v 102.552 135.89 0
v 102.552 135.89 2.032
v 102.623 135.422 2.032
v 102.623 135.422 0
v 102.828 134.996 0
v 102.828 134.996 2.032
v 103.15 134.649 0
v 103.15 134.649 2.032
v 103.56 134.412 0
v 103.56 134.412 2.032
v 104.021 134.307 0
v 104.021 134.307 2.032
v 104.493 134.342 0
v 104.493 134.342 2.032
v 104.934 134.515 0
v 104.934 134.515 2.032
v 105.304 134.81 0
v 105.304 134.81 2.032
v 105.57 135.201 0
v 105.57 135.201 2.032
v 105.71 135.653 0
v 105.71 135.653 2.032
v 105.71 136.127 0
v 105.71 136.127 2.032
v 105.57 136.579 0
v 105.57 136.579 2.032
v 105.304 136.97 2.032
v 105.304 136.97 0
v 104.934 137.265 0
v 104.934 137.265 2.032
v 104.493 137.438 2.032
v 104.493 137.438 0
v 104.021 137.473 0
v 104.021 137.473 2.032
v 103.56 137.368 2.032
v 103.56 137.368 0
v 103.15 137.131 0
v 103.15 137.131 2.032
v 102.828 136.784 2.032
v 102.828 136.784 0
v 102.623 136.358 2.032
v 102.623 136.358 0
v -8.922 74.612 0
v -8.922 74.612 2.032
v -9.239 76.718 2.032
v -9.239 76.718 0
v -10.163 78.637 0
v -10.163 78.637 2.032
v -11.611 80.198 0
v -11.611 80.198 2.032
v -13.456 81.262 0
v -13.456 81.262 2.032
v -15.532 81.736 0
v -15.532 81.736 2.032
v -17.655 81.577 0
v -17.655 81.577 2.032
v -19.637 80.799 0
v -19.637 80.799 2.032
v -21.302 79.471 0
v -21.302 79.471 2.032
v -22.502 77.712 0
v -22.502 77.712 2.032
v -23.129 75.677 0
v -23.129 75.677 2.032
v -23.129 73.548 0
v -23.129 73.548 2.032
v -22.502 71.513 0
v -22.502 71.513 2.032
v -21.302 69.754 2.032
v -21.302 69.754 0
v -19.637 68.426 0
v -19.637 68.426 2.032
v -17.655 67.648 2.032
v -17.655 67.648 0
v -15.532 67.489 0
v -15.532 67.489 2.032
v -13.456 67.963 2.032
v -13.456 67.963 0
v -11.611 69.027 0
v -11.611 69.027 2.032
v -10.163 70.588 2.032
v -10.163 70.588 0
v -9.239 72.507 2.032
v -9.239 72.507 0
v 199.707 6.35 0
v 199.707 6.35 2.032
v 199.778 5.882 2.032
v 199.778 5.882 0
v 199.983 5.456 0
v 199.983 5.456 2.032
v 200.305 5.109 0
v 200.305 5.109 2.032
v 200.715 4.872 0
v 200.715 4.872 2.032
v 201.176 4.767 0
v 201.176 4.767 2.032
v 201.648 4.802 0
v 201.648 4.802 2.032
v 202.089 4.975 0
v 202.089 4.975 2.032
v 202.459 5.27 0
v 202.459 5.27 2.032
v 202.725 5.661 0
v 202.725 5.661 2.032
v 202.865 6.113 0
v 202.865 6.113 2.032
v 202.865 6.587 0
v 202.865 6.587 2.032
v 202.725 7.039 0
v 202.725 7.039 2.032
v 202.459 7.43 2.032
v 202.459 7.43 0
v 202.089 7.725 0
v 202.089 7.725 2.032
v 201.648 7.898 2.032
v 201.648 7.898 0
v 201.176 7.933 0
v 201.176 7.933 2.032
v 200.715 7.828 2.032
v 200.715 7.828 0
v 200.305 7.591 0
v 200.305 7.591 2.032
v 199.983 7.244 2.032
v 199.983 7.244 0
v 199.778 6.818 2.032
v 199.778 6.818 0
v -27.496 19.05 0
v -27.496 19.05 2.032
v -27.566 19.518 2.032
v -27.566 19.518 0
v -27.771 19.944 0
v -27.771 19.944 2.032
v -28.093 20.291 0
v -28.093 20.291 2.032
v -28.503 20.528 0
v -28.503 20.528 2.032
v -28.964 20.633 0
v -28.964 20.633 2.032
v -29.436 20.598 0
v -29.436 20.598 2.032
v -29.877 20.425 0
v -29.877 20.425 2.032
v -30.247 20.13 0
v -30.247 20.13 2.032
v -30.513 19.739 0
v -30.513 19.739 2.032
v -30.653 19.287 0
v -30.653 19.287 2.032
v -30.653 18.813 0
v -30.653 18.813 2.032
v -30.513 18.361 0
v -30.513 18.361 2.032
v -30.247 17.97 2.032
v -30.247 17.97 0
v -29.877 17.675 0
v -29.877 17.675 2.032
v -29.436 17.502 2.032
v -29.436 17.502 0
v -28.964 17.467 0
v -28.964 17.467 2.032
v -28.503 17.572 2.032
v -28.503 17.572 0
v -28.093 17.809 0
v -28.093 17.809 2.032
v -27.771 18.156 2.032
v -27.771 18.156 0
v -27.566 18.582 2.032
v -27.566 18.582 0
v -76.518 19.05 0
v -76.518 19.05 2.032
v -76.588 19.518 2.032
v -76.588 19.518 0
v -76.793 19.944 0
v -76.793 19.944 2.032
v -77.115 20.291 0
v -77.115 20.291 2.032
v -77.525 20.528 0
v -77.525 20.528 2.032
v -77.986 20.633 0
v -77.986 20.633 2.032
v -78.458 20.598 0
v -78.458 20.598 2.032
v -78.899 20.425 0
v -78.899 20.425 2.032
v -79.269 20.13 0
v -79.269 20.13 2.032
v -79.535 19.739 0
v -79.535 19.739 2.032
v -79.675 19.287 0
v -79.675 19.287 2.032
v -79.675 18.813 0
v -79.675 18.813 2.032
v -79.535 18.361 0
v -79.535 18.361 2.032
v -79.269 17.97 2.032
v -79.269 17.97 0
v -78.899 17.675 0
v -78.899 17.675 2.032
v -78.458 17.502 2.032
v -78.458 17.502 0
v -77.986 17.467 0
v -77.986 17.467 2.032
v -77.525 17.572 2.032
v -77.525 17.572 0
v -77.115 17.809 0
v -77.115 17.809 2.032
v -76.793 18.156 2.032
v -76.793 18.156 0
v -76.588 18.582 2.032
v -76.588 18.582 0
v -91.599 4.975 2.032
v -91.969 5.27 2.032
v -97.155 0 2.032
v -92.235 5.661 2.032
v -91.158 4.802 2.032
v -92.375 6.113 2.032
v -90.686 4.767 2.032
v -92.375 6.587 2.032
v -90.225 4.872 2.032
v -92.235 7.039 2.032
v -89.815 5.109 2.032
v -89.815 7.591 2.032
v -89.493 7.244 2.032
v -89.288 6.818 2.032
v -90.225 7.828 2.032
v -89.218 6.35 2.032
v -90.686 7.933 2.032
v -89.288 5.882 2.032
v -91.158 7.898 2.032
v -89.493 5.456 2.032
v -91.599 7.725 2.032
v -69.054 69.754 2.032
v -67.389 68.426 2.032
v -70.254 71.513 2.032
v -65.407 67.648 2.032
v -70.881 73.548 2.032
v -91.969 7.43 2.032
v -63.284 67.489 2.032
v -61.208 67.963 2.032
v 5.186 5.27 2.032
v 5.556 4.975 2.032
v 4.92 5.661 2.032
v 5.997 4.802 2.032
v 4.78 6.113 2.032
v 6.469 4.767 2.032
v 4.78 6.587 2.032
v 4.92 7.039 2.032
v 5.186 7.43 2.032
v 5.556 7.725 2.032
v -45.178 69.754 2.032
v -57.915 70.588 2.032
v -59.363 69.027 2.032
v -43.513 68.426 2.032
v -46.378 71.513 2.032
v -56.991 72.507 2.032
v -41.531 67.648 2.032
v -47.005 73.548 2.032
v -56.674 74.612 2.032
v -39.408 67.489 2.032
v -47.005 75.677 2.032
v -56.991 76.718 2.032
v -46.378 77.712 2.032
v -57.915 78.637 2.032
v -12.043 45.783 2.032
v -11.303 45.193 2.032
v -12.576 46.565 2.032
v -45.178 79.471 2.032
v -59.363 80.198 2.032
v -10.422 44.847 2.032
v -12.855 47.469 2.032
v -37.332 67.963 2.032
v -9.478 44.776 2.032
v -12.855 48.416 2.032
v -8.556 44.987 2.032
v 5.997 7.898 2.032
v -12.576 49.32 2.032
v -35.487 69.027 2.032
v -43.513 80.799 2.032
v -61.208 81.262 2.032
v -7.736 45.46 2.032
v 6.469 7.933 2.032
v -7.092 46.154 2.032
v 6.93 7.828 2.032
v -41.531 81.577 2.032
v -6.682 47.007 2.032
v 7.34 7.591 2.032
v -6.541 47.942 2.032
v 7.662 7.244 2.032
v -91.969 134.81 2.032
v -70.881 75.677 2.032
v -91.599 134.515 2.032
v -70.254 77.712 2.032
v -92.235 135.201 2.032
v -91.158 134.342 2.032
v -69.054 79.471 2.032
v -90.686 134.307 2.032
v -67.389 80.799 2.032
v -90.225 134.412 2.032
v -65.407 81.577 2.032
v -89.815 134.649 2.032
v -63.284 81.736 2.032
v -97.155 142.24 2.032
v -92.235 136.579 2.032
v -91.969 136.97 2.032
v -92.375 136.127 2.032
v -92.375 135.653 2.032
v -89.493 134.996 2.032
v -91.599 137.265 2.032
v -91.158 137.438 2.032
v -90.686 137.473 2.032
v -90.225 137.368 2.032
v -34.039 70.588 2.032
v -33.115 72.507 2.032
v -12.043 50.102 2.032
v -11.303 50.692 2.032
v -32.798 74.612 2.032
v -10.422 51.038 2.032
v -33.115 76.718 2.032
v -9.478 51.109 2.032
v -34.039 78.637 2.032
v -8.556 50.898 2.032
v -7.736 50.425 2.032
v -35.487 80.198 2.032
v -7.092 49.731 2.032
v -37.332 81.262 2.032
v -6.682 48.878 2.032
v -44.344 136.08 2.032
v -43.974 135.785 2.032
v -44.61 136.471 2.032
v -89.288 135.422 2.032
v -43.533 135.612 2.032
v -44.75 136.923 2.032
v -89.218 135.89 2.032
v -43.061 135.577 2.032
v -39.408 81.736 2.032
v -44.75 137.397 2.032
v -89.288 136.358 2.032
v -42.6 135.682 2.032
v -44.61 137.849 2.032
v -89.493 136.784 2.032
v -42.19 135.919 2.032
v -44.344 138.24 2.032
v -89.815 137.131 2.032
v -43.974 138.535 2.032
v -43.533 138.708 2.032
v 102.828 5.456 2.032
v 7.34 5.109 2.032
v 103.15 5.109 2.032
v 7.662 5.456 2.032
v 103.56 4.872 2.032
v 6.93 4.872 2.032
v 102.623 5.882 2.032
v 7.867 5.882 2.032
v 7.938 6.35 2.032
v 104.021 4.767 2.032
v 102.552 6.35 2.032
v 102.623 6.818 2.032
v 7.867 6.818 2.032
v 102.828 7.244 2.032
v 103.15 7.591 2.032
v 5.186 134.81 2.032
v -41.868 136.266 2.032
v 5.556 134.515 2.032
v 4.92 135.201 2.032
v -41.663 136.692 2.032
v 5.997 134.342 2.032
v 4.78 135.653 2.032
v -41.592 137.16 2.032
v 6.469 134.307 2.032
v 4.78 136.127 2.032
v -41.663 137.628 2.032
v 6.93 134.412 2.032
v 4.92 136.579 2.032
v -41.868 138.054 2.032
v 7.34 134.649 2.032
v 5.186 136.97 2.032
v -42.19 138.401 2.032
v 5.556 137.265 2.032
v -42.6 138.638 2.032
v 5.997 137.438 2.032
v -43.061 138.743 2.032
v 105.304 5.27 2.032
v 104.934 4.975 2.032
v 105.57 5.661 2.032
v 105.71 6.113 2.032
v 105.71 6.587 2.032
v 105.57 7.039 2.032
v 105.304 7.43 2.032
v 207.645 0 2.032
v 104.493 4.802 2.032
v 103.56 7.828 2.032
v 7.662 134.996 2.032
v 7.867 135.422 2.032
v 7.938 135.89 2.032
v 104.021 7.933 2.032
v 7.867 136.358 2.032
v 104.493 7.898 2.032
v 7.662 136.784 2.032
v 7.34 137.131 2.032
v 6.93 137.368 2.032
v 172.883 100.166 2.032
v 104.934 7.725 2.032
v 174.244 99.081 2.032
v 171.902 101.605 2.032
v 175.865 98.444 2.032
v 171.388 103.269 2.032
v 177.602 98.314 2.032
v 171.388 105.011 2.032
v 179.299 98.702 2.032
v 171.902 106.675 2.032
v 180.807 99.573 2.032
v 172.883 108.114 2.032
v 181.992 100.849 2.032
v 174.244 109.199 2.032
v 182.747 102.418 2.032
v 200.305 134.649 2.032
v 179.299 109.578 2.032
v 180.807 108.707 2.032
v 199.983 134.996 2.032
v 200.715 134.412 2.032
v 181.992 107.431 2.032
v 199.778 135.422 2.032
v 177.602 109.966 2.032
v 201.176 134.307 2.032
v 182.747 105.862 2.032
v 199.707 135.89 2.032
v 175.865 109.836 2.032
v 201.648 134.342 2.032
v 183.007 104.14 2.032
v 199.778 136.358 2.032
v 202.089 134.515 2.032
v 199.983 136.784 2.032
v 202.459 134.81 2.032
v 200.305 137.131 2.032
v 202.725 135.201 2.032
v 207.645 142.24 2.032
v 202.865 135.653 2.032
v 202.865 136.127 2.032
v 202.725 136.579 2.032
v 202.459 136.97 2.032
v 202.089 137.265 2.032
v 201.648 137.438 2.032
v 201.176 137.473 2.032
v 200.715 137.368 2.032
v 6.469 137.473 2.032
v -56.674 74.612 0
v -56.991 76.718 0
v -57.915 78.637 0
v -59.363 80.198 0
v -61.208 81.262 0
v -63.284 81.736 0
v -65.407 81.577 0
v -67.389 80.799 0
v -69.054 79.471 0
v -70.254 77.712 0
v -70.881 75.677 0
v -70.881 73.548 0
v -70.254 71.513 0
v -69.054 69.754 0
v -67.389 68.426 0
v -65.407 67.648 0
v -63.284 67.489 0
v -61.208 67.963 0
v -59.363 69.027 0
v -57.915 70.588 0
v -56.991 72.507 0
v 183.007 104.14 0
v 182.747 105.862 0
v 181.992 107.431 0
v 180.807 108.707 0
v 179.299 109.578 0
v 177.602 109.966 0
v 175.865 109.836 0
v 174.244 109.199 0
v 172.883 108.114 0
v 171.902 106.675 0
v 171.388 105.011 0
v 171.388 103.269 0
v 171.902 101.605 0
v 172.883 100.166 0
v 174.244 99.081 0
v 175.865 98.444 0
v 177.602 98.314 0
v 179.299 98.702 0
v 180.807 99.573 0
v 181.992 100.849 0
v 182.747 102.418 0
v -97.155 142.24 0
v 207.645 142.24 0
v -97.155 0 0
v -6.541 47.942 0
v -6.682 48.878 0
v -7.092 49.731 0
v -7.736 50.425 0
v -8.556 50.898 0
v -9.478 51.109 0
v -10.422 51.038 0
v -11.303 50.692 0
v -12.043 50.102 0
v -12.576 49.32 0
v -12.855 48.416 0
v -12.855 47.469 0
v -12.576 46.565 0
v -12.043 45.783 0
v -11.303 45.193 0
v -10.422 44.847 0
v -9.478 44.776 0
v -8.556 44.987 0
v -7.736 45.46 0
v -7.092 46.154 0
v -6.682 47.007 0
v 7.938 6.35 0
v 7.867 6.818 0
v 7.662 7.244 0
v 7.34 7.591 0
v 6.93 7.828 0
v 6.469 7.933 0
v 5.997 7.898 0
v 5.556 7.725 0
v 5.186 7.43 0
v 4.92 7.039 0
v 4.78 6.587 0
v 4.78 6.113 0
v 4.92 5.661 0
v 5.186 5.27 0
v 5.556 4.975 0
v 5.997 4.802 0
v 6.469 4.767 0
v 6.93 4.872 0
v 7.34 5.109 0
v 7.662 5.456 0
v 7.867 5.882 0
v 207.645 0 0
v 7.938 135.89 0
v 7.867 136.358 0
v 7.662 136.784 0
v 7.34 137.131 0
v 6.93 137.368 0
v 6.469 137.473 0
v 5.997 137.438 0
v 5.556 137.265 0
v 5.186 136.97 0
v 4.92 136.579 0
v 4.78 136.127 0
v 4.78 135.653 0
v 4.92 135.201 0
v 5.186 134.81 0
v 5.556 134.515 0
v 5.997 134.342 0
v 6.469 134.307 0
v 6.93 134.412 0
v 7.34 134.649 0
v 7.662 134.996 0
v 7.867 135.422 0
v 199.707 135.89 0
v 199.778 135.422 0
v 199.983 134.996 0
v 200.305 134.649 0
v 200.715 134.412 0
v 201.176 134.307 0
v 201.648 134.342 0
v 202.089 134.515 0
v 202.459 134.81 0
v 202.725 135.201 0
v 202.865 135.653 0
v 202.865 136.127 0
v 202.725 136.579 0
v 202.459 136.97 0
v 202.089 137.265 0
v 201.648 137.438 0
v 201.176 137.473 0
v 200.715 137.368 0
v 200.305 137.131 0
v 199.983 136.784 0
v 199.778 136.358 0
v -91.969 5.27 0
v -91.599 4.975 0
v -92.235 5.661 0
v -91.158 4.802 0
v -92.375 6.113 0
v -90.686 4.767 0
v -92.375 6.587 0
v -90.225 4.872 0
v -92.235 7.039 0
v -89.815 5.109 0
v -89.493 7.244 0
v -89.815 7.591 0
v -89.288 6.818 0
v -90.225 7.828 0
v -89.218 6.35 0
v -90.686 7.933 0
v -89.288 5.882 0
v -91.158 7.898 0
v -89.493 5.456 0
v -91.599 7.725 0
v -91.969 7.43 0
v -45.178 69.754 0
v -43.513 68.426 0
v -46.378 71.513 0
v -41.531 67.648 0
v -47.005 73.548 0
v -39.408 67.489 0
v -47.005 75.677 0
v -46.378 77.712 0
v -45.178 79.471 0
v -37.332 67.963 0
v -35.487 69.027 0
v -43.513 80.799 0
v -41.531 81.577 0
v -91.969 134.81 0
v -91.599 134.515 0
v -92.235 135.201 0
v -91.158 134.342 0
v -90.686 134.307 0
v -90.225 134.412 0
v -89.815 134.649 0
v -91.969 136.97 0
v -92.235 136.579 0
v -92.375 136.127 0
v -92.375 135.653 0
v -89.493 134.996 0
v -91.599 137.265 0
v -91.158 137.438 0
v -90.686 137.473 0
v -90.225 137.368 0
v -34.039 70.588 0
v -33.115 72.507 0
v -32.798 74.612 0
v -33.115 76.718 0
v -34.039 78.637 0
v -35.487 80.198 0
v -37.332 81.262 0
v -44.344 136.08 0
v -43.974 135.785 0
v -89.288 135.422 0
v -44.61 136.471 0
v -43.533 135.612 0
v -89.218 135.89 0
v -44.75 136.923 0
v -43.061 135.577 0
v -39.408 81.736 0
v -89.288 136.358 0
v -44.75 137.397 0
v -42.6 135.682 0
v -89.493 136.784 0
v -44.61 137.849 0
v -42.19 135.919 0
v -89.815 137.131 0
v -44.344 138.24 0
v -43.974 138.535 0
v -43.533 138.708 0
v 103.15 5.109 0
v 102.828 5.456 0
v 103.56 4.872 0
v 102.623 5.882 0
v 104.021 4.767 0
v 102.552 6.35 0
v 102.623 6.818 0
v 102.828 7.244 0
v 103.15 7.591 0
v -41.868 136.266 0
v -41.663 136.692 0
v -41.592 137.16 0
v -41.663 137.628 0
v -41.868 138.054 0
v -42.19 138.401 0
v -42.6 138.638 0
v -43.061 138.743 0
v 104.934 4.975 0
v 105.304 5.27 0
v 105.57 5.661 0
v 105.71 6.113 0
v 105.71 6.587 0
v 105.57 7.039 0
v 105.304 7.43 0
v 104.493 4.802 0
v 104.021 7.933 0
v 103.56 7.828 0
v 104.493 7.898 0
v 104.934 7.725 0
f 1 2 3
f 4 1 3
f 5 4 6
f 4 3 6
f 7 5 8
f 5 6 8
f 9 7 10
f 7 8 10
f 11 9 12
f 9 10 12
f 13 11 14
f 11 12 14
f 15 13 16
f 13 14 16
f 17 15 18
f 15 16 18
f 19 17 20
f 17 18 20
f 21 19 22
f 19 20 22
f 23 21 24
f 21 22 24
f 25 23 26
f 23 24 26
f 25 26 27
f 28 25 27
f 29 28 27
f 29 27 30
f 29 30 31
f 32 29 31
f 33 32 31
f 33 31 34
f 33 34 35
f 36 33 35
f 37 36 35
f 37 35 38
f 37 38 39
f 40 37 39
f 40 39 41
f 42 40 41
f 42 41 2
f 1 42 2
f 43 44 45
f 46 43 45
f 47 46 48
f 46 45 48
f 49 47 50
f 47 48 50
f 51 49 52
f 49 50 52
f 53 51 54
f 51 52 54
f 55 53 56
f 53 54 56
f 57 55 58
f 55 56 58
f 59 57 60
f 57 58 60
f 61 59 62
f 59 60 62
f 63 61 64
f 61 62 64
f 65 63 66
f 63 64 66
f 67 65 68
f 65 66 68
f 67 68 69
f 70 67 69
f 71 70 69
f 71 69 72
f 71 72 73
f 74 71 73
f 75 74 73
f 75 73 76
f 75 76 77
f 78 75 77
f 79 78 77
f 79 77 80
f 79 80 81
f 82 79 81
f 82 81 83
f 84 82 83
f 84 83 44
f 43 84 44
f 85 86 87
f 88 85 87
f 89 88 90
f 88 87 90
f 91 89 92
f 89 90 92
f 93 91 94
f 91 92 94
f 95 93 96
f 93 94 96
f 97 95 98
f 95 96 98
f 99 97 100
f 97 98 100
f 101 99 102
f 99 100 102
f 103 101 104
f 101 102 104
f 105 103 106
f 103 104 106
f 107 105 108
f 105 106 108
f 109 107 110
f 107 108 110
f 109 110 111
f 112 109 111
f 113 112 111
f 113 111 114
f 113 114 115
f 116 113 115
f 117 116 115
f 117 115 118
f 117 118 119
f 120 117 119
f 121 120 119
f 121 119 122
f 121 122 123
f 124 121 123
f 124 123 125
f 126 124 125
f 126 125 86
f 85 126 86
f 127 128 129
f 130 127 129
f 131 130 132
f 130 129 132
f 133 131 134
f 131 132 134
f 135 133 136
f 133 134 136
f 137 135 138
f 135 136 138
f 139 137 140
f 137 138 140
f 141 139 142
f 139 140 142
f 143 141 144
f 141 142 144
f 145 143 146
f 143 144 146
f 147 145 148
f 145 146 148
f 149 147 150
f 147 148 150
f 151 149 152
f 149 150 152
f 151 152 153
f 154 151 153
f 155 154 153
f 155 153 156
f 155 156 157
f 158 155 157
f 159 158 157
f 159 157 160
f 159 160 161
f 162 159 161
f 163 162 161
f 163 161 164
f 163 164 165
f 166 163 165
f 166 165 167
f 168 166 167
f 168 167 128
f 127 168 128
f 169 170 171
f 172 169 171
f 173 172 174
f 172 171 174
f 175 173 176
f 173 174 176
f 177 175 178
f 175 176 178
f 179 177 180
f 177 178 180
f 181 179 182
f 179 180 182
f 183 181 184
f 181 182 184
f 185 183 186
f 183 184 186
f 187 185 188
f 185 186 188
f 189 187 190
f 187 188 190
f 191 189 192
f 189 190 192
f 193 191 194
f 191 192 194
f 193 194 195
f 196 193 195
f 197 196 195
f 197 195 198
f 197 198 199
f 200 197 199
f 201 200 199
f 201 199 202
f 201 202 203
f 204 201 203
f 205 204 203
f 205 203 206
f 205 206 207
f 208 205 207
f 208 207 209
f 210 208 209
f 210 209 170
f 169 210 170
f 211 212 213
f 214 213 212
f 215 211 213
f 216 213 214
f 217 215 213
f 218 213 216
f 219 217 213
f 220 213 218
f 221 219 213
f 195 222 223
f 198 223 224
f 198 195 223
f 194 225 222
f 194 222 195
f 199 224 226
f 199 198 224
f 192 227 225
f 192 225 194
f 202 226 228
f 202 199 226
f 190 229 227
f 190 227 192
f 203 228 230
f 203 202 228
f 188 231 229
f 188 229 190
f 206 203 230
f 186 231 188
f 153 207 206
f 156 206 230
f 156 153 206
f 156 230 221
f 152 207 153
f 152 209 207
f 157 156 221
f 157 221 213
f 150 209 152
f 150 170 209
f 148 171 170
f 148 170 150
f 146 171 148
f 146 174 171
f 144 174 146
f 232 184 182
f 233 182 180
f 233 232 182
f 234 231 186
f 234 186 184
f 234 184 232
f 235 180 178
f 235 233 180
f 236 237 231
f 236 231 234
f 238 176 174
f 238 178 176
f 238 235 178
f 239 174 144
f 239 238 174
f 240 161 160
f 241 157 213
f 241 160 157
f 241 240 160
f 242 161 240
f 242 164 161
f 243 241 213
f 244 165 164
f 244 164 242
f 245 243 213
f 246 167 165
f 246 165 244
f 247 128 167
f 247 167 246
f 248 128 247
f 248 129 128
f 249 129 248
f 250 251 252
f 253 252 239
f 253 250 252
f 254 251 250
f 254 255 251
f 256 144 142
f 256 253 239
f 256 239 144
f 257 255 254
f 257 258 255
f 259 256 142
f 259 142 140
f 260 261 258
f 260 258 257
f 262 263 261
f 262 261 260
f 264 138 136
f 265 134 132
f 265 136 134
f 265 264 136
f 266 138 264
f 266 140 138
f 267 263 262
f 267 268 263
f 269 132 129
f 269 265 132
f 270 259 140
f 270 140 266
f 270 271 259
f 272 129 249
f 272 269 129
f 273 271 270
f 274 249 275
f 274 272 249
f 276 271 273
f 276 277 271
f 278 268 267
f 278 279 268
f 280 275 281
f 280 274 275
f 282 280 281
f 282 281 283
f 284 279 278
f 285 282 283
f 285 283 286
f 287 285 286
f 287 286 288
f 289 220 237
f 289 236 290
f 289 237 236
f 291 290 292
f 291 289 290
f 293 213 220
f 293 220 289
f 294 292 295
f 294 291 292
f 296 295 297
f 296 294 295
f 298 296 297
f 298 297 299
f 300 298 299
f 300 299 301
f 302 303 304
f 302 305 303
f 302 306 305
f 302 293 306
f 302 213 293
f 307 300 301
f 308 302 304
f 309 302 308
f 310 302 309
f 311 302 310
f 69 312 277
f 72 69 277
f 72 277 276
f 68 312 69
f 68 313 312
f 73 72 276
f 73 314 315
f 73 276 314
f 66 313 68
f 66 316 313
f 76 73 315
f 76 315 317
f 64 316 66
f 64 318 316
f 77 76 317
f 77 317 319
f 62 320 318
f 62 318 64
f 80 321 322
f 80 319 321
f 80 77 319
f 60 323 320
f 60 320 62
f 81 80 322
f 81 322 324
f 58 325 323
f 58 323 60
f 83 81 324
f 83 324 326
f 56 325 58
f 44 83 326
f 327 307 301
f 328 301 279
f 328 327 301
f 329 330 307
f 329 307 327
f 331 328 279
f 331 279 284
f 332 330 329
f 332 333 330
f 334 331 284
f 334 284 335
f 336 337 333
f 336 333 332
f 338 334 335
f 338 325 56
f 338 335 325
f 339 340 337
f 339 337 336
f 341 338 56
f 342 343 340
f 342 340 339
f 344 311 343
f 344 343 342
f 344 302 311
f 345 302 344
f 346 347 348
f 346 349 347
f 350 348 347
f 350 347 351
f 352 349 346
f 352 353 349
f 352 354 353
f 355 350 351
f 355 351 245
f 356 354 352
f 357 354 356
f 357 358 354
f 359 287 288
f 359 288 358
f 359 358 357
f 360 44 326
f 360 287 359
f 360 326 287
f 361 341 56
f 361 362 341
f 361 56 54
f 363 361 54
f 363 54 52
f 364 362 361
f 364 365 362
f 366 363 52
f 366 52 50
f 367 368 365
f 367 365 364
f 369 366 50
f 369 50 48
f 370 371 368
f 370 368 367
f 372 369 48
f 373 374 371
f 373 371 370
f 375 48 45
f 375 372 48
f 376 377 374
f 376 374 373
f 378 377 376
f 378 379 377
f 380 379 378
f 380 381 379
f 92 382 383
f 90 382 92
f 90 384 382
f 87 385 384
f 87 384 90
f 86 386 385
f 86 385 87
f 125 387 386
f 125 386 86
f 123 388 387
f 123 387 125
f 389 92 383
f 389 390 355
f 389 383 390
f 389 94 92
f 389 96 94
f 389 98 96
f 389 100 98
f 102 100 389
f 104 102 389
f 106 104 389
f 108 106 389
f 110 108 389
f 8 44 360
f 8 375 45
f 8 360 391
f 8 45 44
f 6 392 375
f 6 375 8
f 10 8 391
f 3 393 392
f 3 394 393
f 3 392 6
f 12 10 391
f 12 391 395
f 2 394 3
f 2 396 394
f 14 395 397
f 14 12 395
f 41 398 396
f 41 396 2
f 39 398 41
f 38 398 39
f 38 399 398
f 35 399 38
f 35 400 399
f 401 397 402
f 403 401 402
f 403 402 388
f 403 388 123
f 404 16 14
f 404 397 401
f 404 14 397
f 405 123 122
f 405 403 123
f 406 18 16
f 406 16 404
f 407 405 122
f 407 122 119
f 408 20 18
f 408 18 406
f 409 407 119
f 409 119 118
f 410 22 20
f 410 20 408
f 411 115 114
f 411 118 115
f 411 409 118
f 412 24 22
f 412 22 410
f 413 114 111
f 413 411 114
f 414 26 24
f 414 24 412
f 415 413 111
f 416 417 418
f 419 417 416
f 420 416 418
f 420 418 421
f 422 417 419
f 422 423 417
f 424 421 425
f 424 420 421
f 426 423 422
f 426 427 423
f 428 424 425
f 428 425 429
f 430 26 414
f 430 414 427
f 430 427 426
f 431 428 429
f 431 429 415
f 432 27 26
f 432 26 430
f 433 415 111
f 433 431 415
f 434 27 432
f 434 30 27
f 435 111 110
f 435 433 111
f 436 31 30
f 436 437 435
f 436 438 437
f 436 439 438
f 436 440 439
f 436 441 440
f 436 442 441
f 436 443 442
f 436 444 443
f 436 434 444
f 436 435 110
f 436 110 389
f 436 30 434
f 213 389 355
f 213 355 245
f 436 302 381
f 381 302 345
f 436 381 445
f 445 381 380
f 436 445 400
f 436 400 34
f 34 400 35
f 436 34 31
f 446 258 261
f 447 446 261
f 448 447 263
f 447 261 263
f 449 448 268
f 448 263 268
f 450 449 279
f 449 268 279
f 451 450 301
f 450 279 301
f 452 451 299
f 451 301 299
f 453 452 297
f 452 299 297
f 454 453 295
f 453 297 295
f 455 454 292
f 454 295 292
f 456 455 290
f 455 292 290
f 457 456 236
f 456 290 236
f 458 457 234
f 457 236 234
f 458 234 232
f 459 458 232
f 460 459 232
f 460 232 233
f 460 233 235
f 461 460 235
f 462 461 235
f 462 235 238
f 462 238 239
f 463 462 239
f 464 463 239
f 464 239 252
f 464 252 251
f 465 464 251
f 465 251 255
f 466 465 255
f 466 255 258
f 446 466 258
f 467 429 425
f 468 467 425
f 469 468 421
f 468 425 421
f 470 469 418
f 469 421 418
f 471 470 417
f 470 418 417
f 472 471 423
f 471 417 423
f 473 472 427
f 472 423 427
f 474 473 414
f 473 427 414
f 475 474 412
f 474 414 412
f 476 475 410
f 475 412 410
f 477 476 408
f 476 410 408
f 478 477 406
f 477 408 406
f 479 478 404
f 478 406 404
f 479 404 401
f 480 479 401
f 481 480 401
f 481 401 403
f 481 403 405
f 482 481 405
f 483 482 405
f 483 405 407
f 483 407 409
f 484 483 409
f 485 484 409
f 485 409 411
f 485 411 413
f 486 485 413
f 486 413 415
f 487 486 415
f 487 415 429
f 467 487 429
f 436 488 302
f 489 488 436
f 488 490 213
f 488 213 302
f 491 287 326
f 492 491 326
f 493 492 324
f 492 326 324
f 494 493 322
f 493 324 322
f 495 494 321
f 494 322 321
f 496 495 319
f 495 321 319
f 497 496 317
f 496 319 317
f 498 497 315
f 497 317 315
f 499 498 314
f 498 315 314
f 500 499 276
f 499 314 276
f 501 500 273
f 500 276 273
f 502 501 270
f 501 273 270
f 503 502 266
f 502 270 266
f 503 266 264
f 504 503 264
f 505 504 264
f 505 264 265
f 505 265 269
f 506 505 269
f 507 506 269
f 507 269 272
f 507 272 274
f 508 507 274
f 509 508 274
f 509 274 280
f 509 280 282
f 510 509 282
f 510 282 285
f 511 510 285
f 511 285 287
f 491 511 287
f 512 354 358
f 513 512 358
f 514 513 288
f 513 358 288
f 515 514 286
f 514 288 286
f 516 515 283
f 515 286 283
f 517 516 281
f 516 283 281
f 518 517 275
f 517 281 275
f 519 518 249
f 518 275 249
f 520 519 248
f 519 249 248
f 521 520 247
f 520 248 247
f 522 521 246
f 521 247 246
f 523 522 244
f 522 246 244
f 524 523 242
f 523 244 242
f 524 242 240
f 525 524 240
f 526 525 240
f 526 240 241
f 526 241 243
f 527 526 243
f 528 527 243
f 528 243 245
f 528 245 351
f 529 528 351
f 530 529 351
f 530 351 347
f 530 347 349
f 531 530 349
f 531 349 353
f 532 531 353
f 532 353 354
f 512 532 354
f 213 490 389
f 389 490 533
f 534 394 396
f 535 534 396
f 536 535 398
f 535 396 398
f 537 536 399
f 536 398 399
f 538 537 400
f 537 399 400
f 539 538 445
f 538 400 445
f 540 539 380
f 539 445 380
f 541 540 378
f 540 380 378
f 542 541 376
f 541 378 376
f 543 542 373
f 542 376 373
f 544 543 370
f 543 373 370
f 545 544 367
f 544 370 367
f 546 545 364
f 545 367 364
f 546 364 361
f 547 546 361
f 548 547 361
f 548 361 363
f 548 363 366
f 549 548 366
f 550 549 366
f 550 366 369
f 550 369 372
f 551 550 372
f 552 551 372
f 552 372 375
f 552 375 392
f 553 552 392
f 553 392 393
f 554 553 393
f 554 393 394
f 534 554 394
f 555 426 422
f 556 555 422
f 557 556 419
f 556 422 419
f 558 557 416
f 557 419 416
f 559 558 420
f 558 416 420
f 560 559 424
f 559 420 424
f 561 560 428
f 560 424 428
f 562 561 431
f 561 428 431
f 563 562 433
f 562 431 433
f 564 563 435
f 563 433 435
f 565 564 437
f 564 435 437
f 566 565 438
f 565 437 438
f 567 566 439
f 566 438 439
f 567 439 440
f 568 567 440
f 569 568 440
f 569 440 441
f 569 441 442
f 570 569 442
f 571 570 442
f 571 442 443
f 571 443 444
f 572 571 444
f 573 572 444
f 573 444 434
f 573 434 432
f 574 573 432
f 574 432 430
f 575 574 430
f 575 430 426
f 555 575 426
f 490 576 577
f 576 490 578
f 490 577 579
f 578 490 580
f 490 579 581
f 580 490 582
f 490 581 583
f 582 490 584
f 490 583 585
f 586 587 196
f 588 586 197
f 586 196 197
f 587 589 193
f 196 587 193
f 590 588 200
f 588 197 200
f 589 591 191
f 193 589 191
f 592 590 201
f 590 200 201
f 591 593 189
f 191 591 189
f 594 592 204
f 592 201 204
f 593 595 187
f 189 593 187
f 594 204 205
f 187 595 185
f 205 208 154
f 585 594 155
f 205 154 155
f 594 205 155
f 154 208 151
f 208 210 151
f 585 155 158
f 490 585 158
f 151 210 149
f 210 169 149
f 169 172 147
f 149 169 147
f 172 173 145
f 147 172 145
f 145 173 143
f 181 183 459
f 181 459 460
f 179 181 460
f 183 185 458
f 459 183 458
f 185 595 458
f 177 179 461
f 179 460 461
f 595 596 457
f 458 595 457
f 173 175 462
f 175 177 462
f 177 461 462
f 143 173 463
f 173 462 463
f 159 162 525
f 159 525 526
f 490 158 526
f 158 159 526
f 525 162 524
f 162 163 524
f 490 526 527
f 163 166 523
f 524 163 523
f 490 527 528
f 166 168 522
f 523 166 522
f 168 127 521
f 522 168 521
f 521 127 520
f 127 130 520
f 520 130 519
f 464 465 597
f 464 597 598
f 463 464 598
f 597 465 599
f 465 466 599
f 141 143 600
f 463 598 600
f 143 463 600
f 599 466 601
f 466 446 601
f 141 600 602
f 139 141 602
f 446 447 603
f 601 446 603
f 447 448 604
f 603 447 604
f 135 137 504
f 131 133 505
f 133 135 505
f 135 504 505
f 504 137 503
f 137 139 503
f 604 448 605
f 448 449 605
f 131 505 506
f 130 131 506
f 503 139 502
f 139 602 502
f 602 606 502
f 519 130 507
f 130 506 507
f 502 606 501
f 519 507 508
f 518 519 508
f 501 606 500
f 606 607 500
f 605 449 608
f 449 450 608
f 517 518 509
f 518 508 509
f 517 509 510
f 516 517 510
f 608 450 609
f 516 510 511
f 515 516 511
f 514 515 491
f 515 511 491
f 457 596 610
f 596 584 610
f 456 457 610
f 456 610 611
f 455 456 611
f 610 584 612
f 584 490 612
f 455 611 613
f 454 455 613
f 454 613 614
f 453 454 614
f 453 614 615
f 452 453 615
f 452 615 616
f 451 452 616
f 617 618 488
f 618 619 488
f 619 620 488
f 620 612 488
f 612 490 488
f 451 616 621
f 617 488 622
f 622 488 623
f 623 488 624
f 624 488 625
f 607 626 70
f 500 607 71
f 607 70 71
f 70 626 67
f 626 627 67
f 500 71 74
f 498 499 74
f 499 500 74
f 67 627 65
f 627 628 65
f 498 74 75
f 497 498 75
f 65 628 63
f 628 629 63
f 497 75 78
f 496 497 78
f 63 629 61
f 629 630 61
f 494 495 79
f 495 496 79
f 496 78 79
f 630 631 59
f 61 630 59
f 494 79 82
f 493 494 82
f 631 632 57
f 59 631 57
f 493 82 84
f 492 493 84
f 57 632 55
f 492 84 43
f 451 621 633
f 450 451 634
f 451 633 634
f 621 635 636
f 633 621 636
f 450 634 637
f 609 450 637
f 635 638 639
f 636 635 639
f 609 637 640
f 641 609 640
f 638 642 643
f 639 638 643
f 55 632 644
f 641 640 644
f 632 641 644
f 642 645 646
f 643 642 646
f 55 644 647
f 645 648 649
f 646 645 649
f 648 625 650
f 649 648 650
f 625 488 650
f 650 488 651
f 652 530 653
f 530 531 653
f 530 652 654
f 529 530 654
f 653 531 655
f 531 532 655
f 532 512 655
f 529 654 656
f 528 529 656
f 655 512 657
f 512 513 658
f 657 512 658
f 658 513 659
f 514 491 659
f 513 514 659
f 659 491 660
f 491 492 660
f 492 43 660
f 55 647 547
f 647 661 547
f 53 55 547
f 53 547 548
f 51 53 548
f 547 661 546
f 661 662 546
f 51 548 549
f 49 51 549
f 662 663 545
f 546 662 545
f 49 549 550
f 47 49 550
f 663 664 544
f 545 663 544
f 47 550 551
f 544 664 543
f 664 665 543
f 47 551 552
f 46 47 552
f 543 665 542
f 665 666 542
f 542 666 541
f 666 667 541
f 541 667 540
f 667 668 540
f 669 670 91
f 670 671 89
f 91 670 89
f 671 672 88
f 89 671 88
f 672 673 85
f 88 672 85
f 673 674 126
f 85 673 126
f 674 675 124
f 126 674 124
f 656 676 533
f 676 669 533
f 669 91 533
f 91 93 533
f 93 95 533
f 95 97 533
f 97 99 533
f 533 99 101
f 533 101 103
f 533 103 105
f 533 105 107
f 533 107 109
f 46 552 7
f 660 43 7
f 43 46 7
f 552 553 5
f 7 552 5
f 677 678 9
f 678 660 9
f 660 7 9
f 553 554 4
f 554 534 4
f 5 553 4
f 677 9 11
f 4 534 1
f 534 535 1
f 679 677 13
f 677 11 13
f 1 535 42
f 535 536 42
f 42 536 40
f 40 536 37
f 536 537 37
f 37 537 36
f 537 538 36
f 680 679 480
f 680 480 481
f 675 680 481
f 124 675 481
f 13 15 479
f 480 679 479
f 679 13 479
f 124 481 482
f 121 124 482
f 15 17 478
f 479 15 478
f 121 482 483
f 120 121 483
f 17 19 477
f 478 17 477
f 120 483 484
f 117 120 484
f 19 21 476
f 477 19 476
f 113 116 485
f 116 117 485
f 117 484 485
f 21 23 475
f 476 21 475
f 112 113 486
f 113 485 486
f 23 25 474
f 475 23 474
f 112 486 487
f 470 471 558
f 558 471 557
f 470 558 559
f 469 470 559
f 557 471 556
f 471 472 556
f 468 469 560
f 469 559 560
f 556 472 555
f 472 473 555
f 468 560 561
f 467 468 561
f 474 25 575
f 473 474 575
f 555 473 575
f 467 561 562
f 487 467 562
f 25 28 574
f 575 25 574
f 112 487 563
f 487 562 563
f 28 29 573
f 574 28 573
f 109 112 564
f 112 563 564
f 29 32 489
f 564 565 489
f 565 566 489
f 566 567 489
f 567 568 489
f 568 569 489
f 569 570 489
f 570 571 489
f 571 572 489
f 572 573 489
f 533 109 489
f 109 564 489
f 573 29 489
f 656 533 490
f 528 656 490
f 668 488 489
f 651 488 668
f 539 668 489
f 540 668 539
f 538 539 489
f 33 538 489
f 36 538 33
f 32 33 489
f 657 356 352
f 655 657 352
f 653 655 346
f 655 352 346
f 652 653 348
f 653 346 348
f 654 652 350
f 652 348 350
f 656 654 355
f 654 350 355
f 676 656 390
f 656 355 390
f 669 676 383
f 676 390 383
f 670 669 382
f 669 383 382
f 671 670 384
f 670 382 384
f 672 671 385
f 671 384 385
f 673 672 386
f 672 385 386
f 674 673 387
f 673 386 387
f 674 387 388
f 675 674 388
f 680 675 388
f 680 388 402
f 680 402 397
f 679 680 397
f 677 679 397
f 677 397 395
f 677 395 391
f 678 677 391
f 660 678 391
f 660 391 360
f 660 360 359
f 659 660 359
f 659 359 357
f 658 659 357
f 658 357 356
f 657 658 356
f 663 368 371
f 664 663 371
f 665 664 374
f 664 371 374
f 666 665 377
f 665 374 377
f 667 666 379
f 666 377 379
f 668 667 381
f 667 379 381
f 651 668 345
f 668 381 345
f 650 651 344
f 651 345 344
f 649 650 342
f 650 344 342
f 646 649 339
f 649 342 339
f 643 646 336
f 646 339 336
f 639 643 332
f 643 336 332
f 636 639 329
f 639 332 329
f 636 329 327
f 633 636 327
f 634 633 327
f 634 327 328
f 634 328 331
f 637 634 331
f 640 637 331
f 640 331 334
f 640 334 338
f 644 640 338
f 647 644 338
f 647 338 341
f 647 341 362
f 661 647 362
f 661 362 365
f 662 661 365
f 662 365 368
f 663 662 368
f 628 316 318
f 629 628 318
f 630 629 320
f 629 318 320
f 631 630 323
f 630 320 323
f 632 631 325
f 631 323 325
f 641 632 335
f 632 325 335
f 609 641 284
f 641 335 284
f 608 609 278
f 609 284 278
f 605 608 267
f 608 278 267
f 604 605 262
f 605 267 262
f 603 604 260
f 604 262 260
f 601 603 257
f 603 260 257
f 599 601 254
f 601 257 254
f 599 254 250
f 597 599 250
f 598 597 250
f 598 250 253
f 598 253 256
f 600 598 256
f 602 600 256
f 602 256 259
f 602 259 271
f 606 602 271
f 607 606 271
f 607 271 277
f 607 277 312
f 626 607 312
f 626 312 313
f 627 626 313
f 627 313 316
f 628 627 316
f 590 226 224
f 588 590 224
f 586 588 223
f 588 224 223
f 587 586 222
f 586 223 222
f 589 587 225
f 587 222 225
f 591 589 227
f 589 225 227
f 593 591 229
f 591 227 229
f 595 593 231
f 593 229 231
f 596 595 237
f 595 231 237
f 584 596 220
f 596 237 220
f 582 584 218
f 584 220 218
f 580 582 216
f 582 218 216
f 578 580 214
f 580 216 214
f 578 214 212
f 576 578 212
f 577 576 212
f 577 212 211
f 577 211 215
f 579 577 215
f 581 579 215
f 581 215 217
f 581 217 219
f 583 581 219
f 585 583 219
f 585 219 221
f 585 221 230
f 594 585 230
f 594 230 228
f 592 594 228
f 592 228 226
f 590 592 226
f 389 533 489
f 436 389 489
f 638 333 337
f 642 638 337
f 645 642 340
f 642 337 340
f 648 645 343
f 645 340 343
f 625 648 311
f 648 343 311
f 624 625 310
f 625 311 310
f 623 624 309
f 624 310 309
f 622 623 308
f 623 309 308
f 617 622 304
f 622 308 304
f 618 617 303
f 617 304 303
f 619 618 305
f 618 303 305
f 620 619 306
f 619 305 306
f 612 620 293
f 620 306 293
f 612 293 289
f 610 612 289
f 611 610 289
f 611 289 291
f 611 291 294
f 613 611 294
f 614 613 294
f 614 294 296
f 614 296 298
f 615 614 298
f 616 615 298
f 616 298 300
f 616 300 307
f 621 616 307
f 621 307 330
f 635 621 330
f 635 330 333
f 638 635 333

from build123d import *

# Parameters (mm, degrees)
SKETCH1_W          = 304.8
SKETCH1_H          = 142.24
EXTRUDE1_DEPTH     = 2.032
SKETCH3_R          = 1.5875
CUT_EXTRUDE1_DEPTH = 252.699806613
SKETCH4_R          = 7.14375
SKETCH4_R_2        = 1.5875
SKETCH4_R_3        = 3.175
SKETCH4_R_4        = 5.842
EXTRUDE2_DEPTH     = 252.699806613


with BuildPart() as part:
    # Sketch1 → Extrude1 (new body)
    with BuildSketch(Plane.XY):
        with Locations((55.245, 71.12)):
            Rectangle(SKETCH1_W, SKETCH1_H)
    extrude(amount=EXTRUDE1_DEPTH)

    # Sketch3 → Cut-Extrude1 (cut, through all)
    with BuildSketch(Plane.XY.offset(2.032)):
        with Locations((-90.805, 135.89)):
            Circle(SKETCH3_R)
        with Locations((-90.805, 6.35)):
            Circle(SKETCH3_R)
        with Locations((6.35, 135.89)):
            Circle(SKETCH3_R)
        with Locations((6.35, 6.35)):
            Circle(SKETCH3_R)
        with Locations(Location((104.14, 6.35, 0), (0, 0, 180))):
            Circle(SKETCH3_R)
        with Locations(Location((104.14, 135.89, 0), (0, 0, 180))):
            Circle(SKETCH3_R)
        with Locations(Location((201.295, 6.35, 0), (0, 0, 180))):
            Circle(SKETCH3_R)
        with Locations(Location((201.295, 135.89, 0), (0, 0, 180))):
            Circle(SKETCH3_R)
    extrude(amount=-CUT_EXTRUDE1_DEPTH, mode=Mode.SUBTRACT)

    # Sketch4 → Extrude2 (cut, through all)
    with BuildSketch(Plane.XY.offset(2.032)):
        with Locations((-63.8175, 74.6125)):
            Circle(SKETCH4_R)
        with Locations((-39.9415, 74.6125)):
            Circle(SKETCH4_R)
        with Locations((-16.0655, 74.6125)):
            Circle(SKETCH4_R)
        with Locations((-43.18, 137.16)):
            Circle(SKETCH4_R_2)
        with Locations((-9.7155, 47.9425)):
            Circle(SKETCH4_R_3)
        with Locations((-78.105, 19.05)):
            Circle(SKETCH4_R_2)
        with Locations((-29.083, 19.05)):
            Circle(SKETCH4_R_2)
        with Locations((177.165, 104.14)):
            Circle(SKETCH4_R_4)
    extrude(amount=-EXTRUDE2_DEPTH, mode=Mode.SUBTRACT)


solid = part.part
